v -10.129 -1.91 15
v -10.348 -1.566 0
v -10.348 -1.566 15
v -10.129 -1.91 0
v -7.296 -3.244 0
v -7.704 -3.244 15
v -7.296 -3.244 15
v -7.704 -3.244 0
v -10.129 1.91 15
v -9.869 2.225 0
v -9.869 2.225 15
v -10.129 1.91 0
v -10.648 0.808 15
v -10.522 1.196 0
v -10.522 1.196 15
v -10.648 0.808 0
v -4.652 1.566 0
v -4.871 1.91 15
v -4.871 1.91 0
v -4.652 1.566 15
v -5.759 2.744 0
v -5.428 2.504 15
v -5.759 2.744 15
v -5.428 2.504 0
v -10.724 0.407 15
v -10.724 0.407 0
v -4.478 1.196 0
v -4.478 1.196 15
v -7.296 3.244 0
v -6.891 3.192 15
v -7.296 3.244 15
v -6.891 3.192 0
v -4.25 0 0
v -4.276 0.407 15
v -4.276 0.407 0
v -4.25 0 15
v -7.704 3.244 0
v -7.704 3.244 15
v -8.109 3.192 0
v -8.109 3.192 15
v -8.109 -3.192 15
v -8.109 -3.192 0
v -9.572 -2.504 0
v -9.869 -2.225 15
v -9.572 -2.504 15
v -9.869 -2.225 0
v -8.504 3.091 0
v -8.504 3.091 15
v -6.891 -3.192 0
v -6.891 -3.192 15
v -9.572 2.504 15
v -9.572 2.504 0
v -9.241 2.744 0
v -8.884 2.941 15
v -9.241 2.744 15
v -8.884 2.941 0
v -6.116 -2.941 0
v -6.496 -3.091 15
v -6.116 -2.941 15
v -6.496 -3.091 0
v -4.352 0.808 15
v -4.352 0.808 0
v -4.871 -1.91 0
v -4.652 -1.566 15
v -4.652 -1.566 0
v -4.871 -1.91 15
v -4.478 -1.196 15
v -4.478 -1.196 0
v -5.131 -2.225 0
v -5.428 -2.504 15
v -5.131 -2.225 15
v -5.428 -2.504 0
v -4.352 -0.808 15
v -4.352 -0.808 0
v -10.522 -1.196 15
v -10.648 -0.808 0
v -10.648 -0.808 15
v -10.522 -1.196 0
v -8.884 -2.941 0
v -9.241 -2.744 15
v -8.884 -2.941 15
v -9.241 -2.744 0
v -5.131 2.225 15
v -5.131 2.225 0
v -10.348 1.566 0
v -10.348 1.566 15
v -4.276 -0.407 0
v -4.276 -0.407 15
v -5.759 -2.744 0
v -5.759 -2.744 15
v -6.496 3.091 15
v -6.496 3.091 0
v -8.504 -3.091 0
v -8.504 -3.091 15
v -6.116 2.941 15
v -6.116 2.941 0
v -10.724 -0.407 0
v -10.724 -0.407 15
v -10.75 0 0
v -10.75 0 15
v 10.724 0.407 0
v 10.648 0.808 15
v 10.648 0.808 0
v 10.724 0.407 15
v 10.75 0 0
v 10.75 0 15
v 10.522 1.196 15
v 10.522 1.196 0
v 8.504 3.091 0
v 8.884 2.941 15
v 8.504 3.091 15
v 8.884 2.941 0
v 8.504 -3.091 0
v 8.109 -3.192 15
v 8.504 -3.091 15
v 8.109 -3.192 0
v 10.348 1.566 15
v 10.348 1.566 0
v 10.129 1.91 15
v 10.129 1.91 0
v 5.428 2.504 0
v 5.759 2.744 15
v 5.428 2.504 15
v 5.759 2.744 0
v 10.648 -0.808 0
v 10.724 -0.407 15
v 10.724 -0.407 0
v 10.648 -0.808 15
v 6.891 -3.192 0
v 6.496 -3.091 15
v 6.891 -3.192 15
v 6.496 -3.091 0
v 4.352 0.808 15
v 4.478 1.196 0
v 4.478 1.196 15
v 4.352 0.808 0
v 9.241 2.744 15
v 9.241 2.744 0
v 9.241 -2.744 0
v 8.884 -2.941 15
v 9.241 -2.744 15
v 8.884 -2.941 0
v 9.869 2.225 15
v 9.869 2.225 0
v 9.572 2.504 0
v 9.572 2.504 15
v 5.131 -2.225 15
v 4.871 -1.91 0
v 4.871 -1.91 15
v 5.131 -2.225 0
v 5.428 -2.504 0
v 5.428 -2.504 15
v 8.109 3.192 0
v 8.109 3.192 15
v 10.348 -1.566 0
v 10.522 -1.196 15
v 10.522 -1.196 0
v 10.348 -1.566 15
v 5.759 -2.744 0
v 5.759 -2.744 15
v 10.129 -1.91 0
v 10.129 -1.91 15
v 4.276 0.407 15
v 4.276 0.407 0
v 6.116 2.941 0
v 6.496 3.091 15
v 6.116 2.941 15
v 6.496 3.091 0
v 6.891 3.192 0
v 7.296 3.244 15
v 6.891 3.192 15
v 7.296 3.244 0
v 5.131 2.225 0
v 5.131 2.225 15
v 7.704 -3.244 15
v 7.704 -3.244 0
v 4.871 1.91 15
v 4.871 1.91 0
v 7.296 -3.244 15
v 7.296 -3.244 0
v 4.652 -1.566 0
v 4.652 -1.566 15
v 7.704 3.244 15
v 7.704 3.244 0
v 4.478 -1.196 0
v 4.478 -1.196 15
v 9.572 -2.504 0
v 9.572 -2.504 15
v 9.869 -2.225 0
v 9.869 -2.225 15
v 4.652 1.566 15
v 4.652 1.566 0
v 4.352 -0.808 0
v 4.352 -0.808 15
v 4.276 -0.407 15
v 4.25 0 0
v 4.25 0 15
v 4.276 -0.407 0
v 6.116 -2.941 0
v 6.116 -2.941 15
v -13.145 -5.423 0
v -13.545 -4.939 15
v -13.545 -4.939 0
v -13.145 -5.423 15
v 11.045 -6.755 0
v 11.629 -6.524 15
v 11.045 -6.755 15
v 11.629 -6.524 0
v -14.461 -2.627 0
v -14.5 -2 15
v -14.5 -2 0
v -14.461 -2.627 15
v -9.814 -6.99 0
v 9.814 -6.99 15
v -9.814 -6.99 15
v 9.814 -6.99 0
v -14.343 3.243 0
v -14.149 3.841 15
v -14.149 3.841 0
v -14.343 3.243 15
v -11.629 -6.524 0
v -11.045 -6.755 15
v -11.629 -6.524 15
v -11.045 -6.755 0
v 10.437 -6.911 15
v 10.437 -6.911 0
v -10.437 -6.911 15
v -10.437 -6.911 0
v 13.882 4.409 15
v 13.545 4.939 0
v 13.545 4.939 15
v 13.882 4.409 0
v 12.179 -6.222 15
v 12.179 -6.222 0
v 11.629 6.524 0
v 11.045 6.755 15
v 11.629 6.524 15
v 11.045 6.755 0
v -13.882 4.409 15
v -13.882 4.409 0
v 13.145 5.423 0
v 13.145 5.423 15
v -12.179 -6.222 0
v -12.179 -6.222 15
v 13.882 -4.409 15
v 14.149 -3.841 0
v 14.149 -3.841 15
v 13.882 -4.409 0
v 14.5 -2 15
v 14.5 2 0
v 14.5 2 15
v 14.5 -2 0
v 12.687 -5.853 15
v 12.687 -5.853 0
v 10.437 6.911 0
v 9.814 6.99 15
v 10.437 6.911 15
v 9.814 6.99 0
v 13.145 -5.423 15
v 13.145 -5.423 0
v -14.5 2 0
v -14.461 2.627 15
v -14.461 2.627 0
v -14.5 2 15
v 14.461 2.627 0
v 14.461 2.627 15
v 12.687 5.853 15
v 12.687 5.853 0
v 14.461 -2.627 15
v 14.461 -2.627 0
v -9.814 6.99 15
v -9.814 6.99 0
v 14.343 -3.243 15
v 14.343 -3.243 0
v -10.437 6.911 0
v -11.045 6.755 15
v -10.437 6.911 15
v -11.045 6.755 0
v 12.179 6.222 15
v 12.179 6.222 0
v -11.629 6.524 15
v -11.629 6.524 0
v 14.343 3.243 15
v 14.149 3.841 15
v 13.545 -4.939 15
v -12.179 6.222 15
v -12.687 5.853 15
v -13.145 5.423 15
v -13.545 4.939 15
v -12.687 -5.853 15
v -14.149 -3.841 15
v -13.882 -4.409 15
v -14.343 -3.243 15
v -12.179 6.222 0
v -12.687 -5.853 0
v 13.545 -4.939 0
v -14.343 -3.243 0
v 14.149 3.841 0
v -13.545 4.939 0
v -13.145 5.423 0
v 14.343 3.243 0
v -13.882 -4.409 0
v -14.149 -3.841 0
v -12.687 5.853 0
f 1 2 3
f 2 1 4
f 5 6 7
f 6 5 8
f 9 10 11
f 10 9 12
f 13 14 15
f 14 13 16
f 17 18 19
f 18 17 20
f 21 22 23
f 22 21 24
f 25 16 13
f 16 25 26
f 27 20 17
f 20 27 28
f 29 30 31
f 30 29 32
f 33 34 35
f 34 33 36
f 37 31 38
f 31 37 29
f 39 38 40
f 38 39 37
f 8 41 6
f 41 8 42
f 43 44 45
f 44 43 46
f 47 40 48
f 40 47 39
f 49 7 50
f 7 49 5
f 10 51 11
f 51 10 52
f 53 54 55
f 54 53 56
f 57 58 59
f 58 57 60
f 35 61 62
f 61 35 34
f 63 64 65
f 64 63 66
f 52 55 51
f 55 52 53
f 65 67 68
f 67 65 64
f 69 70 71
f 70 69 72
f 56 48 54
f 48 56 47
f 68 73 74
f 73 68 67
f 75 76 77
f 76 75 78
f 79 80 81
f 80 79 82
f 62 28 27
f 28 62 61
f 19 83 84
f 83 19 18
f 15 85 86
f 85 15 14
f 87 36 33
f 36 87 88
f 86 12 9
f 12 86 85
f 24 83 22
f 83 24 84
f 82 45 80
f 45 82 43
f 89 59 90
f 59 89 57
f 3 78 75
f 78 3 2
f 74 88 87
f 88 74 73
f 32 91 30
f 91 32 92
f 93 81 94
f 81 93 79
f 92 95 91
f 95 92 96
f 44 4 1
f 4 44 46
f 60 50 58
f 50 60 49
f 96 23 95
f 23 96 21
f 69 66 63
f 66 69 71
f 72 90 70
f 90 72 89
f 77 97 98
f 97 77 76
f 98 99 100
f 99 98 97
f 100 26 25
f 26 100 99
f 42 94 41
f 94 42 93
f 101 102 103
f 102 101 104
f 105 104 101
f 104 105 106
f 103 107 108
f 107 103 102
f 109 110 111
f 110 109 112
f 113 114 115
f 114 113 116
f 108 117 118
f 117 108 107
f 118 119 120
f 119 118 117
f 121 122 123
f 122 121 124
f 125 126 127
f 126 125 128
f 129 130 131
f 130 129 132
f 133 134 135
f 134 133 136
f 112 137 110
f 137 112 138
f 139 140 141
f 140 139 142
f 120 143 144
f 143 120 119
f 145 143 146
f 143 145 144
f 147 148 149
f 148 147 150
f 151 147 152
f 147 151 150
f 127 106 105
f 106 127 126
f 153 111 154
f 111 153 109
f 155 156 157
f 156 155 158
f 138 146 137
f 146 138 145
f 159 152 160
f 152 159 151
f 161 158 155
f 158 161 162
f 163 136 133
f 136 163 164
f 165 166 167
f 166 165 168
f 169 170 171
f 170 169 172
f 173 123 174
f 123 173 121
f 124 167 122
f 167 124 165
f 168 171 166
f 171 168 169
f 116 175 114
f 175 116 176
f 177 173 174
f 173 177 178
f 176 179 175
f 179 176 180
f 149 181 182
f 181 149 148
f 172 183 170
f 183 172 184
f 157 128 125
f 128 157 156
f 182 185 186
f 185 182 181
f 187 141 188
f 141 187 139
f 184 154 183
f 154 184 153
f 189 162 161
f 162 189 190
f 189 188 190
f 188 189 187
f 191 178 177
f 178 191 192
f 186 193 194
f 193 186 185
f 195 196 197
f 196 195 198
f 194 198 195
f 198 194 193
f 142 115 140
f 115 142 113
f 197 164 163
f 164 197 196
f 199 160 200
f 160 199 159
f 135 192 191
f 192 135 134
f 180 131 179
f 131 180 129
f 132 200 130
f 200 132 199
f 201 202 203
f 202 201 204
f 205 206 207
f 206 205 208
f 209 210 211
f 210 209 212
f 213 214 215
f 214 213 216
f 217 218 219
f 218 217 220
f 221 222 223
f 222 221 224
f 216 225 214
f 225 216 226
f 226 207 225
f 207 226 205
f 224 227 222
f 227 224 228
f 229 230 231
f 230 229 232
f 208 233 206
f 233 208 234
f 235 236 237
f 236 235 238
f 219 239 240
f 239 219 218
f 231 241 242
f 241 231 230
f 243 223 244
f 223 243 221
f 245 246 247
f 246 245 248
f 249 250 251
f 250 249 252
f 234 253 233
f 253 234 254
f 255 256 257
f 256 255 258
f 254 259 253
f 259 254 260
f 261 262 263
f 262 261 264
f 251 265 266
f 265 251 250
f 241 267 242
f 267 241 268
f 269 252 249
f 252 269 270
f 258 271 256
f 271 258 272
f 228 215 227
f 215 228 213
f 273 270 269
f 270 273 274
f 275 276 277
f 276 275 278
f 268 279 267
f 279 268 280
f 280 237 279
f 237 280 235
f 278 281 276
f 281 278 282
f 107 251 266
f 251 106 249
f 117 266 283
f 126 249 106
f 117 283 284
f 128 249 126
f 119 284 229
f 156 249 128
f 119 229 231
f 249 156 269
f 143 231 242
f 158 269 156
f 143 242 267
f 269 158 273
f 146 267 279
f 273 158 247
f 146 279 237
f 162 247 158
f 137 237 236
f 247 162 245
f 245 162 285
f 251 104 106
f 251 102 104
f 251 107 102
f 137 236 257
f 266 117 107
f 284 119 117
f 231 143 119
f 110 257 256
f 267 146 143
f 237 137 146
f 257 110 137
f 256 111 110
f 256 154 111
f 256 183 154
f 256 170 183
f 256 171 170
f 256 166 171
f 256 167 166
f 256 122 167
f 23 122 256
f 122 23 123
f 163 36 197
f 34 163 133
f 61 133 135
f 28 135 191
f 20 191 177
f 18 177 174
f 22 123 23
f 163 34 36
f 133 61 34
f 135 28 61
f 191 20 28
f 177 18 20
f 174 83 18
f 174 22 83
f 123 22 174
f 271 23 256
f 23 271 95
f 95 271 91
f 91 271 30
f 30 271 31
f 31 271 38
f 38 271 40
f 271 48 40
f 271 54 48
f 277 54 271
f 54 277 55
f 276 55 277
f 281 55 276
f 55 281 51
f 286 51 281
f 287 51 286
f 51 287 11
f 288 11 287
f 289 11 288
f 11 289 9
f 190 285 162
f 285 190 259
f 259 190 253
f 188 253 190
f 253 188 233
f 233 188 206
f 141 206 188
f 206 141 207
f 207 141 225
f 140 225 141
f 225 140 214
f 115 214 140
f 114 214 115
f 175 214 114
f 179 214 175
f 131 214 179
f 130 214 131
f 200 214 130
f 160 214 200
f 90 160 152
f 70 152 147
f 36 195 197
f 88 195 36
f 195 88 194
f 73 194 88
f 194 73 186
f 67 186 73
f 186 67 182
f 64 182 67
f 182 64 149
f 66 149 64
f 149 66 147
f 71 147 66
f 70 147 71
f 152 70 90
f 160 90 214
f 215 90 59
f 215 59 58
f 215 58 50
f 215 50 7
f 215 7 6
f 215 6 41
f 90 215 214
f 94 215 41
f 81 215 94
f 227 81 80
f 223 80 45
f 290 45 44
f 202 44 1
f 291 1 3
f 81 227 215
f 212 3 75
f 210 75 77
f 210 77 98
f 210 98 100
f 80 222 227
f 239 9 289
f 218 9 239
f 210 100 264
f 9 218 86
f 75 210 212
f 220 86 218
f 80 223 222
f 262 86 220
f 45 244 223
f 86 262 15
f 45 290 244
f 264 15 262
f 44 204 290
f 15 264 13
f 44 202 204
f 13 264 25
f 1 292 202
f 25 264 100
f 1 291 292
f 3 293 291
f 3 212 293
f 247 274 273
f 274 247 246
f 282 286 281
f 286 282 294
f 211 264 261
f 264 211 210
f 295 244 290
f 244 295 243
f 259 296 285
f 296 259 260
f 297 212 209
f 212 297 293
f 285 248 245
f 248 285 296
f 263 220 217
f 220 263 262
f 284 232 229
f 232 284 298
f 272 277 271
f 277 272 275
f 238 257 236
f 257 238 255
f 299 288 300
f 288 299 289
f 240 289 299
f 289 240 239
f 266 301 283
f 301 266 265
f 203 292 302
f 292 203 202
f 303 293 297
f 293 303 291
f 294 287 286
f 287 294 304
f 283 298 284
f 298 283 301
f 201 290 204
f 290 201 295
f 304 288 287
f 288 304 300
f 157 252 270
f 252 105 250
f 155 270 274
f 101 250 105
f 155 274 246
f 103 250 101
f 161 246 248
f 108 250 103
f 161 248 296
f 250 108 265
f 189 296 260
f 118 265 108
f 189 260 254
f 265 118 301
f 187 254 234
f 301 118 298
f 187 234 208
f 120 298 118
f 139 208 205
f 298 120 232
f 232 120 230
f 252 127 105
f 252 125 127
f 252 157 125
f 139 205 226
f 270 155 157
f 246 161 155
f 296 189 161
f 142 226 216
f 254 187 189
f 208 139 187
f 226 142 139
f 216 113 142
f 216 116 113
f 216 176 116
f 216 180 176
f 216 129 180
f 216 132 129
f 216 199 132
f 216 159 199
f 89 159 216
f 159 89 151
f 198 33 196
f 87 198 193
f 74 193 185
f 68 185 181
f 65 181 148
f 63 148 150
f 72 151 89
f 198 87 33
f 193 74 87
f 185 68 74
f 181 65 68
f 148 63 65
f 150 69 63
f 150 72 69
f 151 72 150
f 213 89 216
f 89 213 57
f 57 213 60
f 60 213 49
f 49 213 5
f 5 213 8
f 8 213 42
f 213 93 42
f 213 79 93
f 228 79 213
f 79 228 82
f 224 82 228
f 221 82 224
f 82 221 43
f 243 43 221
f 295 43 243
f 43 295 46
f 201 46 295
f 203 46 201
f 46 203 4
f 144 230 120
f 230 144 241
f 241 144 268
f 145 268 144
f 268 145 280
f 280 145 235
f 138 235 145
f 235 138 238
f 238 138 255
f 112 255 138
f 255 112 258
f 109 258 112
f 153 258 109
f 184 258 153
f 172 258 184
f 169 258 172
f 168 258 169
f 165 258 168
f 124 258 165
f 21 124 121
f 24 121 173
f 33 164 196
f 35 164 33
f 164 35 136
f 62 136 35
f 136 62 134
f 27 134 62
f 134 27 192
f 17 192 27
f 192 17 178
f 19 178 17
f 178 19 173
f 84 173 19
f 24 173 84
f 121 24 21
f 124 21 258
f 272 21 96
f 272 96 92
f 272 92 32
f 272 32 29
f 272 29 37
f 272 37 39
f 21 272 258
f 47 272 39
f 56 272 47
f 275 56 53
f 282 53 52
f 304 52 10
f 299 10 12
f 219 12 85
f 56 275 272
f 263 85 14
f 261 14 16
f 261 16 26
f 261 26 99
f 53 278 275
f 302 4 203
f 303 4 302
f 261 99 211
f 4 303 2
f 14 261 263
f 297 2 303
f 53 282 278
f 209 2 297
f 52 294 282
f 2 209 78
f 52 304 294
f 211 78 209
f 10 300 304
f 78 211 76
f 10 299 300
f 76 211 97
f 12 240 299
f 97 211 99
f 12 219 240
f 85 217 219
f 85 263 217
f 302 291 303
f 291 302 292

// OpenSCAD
$fn = 50;


difference() {
	union() {
		hull() {
			translate(v = [-9.5000000000, 2.0000000000, 0]) {
				cylinder(h = 15, r = 5);
			}
			translate(v = [9.5000000000, 2.0000000000, 0]) {
				cylinder(h = 15, r = 5);
			}
			translate(v = [-9.5000000000, -2.0000000000, 0]) {
				cylinder(h = 15, r = 5);
			}
			translate(v = [9.5000000000, -2.0000000000, 0]) {
				cylinder(h = 15, r = 5);
			}
		}
	}
	union() {
		translate(v = [-7.5000000000, 0.0000000000, 0]) {
			translate(v = [0, 0, -100]) {
				cylinder(h = 200, r = 3.2500000000);
			}
		}
		translate(v = [7.5000000000, 0.0000000000, 0]) {
			translate(v = [0, 0, -100]) {
				cylinder(h = 200, r = 3.2500000000);
			}
		}
	}
}
